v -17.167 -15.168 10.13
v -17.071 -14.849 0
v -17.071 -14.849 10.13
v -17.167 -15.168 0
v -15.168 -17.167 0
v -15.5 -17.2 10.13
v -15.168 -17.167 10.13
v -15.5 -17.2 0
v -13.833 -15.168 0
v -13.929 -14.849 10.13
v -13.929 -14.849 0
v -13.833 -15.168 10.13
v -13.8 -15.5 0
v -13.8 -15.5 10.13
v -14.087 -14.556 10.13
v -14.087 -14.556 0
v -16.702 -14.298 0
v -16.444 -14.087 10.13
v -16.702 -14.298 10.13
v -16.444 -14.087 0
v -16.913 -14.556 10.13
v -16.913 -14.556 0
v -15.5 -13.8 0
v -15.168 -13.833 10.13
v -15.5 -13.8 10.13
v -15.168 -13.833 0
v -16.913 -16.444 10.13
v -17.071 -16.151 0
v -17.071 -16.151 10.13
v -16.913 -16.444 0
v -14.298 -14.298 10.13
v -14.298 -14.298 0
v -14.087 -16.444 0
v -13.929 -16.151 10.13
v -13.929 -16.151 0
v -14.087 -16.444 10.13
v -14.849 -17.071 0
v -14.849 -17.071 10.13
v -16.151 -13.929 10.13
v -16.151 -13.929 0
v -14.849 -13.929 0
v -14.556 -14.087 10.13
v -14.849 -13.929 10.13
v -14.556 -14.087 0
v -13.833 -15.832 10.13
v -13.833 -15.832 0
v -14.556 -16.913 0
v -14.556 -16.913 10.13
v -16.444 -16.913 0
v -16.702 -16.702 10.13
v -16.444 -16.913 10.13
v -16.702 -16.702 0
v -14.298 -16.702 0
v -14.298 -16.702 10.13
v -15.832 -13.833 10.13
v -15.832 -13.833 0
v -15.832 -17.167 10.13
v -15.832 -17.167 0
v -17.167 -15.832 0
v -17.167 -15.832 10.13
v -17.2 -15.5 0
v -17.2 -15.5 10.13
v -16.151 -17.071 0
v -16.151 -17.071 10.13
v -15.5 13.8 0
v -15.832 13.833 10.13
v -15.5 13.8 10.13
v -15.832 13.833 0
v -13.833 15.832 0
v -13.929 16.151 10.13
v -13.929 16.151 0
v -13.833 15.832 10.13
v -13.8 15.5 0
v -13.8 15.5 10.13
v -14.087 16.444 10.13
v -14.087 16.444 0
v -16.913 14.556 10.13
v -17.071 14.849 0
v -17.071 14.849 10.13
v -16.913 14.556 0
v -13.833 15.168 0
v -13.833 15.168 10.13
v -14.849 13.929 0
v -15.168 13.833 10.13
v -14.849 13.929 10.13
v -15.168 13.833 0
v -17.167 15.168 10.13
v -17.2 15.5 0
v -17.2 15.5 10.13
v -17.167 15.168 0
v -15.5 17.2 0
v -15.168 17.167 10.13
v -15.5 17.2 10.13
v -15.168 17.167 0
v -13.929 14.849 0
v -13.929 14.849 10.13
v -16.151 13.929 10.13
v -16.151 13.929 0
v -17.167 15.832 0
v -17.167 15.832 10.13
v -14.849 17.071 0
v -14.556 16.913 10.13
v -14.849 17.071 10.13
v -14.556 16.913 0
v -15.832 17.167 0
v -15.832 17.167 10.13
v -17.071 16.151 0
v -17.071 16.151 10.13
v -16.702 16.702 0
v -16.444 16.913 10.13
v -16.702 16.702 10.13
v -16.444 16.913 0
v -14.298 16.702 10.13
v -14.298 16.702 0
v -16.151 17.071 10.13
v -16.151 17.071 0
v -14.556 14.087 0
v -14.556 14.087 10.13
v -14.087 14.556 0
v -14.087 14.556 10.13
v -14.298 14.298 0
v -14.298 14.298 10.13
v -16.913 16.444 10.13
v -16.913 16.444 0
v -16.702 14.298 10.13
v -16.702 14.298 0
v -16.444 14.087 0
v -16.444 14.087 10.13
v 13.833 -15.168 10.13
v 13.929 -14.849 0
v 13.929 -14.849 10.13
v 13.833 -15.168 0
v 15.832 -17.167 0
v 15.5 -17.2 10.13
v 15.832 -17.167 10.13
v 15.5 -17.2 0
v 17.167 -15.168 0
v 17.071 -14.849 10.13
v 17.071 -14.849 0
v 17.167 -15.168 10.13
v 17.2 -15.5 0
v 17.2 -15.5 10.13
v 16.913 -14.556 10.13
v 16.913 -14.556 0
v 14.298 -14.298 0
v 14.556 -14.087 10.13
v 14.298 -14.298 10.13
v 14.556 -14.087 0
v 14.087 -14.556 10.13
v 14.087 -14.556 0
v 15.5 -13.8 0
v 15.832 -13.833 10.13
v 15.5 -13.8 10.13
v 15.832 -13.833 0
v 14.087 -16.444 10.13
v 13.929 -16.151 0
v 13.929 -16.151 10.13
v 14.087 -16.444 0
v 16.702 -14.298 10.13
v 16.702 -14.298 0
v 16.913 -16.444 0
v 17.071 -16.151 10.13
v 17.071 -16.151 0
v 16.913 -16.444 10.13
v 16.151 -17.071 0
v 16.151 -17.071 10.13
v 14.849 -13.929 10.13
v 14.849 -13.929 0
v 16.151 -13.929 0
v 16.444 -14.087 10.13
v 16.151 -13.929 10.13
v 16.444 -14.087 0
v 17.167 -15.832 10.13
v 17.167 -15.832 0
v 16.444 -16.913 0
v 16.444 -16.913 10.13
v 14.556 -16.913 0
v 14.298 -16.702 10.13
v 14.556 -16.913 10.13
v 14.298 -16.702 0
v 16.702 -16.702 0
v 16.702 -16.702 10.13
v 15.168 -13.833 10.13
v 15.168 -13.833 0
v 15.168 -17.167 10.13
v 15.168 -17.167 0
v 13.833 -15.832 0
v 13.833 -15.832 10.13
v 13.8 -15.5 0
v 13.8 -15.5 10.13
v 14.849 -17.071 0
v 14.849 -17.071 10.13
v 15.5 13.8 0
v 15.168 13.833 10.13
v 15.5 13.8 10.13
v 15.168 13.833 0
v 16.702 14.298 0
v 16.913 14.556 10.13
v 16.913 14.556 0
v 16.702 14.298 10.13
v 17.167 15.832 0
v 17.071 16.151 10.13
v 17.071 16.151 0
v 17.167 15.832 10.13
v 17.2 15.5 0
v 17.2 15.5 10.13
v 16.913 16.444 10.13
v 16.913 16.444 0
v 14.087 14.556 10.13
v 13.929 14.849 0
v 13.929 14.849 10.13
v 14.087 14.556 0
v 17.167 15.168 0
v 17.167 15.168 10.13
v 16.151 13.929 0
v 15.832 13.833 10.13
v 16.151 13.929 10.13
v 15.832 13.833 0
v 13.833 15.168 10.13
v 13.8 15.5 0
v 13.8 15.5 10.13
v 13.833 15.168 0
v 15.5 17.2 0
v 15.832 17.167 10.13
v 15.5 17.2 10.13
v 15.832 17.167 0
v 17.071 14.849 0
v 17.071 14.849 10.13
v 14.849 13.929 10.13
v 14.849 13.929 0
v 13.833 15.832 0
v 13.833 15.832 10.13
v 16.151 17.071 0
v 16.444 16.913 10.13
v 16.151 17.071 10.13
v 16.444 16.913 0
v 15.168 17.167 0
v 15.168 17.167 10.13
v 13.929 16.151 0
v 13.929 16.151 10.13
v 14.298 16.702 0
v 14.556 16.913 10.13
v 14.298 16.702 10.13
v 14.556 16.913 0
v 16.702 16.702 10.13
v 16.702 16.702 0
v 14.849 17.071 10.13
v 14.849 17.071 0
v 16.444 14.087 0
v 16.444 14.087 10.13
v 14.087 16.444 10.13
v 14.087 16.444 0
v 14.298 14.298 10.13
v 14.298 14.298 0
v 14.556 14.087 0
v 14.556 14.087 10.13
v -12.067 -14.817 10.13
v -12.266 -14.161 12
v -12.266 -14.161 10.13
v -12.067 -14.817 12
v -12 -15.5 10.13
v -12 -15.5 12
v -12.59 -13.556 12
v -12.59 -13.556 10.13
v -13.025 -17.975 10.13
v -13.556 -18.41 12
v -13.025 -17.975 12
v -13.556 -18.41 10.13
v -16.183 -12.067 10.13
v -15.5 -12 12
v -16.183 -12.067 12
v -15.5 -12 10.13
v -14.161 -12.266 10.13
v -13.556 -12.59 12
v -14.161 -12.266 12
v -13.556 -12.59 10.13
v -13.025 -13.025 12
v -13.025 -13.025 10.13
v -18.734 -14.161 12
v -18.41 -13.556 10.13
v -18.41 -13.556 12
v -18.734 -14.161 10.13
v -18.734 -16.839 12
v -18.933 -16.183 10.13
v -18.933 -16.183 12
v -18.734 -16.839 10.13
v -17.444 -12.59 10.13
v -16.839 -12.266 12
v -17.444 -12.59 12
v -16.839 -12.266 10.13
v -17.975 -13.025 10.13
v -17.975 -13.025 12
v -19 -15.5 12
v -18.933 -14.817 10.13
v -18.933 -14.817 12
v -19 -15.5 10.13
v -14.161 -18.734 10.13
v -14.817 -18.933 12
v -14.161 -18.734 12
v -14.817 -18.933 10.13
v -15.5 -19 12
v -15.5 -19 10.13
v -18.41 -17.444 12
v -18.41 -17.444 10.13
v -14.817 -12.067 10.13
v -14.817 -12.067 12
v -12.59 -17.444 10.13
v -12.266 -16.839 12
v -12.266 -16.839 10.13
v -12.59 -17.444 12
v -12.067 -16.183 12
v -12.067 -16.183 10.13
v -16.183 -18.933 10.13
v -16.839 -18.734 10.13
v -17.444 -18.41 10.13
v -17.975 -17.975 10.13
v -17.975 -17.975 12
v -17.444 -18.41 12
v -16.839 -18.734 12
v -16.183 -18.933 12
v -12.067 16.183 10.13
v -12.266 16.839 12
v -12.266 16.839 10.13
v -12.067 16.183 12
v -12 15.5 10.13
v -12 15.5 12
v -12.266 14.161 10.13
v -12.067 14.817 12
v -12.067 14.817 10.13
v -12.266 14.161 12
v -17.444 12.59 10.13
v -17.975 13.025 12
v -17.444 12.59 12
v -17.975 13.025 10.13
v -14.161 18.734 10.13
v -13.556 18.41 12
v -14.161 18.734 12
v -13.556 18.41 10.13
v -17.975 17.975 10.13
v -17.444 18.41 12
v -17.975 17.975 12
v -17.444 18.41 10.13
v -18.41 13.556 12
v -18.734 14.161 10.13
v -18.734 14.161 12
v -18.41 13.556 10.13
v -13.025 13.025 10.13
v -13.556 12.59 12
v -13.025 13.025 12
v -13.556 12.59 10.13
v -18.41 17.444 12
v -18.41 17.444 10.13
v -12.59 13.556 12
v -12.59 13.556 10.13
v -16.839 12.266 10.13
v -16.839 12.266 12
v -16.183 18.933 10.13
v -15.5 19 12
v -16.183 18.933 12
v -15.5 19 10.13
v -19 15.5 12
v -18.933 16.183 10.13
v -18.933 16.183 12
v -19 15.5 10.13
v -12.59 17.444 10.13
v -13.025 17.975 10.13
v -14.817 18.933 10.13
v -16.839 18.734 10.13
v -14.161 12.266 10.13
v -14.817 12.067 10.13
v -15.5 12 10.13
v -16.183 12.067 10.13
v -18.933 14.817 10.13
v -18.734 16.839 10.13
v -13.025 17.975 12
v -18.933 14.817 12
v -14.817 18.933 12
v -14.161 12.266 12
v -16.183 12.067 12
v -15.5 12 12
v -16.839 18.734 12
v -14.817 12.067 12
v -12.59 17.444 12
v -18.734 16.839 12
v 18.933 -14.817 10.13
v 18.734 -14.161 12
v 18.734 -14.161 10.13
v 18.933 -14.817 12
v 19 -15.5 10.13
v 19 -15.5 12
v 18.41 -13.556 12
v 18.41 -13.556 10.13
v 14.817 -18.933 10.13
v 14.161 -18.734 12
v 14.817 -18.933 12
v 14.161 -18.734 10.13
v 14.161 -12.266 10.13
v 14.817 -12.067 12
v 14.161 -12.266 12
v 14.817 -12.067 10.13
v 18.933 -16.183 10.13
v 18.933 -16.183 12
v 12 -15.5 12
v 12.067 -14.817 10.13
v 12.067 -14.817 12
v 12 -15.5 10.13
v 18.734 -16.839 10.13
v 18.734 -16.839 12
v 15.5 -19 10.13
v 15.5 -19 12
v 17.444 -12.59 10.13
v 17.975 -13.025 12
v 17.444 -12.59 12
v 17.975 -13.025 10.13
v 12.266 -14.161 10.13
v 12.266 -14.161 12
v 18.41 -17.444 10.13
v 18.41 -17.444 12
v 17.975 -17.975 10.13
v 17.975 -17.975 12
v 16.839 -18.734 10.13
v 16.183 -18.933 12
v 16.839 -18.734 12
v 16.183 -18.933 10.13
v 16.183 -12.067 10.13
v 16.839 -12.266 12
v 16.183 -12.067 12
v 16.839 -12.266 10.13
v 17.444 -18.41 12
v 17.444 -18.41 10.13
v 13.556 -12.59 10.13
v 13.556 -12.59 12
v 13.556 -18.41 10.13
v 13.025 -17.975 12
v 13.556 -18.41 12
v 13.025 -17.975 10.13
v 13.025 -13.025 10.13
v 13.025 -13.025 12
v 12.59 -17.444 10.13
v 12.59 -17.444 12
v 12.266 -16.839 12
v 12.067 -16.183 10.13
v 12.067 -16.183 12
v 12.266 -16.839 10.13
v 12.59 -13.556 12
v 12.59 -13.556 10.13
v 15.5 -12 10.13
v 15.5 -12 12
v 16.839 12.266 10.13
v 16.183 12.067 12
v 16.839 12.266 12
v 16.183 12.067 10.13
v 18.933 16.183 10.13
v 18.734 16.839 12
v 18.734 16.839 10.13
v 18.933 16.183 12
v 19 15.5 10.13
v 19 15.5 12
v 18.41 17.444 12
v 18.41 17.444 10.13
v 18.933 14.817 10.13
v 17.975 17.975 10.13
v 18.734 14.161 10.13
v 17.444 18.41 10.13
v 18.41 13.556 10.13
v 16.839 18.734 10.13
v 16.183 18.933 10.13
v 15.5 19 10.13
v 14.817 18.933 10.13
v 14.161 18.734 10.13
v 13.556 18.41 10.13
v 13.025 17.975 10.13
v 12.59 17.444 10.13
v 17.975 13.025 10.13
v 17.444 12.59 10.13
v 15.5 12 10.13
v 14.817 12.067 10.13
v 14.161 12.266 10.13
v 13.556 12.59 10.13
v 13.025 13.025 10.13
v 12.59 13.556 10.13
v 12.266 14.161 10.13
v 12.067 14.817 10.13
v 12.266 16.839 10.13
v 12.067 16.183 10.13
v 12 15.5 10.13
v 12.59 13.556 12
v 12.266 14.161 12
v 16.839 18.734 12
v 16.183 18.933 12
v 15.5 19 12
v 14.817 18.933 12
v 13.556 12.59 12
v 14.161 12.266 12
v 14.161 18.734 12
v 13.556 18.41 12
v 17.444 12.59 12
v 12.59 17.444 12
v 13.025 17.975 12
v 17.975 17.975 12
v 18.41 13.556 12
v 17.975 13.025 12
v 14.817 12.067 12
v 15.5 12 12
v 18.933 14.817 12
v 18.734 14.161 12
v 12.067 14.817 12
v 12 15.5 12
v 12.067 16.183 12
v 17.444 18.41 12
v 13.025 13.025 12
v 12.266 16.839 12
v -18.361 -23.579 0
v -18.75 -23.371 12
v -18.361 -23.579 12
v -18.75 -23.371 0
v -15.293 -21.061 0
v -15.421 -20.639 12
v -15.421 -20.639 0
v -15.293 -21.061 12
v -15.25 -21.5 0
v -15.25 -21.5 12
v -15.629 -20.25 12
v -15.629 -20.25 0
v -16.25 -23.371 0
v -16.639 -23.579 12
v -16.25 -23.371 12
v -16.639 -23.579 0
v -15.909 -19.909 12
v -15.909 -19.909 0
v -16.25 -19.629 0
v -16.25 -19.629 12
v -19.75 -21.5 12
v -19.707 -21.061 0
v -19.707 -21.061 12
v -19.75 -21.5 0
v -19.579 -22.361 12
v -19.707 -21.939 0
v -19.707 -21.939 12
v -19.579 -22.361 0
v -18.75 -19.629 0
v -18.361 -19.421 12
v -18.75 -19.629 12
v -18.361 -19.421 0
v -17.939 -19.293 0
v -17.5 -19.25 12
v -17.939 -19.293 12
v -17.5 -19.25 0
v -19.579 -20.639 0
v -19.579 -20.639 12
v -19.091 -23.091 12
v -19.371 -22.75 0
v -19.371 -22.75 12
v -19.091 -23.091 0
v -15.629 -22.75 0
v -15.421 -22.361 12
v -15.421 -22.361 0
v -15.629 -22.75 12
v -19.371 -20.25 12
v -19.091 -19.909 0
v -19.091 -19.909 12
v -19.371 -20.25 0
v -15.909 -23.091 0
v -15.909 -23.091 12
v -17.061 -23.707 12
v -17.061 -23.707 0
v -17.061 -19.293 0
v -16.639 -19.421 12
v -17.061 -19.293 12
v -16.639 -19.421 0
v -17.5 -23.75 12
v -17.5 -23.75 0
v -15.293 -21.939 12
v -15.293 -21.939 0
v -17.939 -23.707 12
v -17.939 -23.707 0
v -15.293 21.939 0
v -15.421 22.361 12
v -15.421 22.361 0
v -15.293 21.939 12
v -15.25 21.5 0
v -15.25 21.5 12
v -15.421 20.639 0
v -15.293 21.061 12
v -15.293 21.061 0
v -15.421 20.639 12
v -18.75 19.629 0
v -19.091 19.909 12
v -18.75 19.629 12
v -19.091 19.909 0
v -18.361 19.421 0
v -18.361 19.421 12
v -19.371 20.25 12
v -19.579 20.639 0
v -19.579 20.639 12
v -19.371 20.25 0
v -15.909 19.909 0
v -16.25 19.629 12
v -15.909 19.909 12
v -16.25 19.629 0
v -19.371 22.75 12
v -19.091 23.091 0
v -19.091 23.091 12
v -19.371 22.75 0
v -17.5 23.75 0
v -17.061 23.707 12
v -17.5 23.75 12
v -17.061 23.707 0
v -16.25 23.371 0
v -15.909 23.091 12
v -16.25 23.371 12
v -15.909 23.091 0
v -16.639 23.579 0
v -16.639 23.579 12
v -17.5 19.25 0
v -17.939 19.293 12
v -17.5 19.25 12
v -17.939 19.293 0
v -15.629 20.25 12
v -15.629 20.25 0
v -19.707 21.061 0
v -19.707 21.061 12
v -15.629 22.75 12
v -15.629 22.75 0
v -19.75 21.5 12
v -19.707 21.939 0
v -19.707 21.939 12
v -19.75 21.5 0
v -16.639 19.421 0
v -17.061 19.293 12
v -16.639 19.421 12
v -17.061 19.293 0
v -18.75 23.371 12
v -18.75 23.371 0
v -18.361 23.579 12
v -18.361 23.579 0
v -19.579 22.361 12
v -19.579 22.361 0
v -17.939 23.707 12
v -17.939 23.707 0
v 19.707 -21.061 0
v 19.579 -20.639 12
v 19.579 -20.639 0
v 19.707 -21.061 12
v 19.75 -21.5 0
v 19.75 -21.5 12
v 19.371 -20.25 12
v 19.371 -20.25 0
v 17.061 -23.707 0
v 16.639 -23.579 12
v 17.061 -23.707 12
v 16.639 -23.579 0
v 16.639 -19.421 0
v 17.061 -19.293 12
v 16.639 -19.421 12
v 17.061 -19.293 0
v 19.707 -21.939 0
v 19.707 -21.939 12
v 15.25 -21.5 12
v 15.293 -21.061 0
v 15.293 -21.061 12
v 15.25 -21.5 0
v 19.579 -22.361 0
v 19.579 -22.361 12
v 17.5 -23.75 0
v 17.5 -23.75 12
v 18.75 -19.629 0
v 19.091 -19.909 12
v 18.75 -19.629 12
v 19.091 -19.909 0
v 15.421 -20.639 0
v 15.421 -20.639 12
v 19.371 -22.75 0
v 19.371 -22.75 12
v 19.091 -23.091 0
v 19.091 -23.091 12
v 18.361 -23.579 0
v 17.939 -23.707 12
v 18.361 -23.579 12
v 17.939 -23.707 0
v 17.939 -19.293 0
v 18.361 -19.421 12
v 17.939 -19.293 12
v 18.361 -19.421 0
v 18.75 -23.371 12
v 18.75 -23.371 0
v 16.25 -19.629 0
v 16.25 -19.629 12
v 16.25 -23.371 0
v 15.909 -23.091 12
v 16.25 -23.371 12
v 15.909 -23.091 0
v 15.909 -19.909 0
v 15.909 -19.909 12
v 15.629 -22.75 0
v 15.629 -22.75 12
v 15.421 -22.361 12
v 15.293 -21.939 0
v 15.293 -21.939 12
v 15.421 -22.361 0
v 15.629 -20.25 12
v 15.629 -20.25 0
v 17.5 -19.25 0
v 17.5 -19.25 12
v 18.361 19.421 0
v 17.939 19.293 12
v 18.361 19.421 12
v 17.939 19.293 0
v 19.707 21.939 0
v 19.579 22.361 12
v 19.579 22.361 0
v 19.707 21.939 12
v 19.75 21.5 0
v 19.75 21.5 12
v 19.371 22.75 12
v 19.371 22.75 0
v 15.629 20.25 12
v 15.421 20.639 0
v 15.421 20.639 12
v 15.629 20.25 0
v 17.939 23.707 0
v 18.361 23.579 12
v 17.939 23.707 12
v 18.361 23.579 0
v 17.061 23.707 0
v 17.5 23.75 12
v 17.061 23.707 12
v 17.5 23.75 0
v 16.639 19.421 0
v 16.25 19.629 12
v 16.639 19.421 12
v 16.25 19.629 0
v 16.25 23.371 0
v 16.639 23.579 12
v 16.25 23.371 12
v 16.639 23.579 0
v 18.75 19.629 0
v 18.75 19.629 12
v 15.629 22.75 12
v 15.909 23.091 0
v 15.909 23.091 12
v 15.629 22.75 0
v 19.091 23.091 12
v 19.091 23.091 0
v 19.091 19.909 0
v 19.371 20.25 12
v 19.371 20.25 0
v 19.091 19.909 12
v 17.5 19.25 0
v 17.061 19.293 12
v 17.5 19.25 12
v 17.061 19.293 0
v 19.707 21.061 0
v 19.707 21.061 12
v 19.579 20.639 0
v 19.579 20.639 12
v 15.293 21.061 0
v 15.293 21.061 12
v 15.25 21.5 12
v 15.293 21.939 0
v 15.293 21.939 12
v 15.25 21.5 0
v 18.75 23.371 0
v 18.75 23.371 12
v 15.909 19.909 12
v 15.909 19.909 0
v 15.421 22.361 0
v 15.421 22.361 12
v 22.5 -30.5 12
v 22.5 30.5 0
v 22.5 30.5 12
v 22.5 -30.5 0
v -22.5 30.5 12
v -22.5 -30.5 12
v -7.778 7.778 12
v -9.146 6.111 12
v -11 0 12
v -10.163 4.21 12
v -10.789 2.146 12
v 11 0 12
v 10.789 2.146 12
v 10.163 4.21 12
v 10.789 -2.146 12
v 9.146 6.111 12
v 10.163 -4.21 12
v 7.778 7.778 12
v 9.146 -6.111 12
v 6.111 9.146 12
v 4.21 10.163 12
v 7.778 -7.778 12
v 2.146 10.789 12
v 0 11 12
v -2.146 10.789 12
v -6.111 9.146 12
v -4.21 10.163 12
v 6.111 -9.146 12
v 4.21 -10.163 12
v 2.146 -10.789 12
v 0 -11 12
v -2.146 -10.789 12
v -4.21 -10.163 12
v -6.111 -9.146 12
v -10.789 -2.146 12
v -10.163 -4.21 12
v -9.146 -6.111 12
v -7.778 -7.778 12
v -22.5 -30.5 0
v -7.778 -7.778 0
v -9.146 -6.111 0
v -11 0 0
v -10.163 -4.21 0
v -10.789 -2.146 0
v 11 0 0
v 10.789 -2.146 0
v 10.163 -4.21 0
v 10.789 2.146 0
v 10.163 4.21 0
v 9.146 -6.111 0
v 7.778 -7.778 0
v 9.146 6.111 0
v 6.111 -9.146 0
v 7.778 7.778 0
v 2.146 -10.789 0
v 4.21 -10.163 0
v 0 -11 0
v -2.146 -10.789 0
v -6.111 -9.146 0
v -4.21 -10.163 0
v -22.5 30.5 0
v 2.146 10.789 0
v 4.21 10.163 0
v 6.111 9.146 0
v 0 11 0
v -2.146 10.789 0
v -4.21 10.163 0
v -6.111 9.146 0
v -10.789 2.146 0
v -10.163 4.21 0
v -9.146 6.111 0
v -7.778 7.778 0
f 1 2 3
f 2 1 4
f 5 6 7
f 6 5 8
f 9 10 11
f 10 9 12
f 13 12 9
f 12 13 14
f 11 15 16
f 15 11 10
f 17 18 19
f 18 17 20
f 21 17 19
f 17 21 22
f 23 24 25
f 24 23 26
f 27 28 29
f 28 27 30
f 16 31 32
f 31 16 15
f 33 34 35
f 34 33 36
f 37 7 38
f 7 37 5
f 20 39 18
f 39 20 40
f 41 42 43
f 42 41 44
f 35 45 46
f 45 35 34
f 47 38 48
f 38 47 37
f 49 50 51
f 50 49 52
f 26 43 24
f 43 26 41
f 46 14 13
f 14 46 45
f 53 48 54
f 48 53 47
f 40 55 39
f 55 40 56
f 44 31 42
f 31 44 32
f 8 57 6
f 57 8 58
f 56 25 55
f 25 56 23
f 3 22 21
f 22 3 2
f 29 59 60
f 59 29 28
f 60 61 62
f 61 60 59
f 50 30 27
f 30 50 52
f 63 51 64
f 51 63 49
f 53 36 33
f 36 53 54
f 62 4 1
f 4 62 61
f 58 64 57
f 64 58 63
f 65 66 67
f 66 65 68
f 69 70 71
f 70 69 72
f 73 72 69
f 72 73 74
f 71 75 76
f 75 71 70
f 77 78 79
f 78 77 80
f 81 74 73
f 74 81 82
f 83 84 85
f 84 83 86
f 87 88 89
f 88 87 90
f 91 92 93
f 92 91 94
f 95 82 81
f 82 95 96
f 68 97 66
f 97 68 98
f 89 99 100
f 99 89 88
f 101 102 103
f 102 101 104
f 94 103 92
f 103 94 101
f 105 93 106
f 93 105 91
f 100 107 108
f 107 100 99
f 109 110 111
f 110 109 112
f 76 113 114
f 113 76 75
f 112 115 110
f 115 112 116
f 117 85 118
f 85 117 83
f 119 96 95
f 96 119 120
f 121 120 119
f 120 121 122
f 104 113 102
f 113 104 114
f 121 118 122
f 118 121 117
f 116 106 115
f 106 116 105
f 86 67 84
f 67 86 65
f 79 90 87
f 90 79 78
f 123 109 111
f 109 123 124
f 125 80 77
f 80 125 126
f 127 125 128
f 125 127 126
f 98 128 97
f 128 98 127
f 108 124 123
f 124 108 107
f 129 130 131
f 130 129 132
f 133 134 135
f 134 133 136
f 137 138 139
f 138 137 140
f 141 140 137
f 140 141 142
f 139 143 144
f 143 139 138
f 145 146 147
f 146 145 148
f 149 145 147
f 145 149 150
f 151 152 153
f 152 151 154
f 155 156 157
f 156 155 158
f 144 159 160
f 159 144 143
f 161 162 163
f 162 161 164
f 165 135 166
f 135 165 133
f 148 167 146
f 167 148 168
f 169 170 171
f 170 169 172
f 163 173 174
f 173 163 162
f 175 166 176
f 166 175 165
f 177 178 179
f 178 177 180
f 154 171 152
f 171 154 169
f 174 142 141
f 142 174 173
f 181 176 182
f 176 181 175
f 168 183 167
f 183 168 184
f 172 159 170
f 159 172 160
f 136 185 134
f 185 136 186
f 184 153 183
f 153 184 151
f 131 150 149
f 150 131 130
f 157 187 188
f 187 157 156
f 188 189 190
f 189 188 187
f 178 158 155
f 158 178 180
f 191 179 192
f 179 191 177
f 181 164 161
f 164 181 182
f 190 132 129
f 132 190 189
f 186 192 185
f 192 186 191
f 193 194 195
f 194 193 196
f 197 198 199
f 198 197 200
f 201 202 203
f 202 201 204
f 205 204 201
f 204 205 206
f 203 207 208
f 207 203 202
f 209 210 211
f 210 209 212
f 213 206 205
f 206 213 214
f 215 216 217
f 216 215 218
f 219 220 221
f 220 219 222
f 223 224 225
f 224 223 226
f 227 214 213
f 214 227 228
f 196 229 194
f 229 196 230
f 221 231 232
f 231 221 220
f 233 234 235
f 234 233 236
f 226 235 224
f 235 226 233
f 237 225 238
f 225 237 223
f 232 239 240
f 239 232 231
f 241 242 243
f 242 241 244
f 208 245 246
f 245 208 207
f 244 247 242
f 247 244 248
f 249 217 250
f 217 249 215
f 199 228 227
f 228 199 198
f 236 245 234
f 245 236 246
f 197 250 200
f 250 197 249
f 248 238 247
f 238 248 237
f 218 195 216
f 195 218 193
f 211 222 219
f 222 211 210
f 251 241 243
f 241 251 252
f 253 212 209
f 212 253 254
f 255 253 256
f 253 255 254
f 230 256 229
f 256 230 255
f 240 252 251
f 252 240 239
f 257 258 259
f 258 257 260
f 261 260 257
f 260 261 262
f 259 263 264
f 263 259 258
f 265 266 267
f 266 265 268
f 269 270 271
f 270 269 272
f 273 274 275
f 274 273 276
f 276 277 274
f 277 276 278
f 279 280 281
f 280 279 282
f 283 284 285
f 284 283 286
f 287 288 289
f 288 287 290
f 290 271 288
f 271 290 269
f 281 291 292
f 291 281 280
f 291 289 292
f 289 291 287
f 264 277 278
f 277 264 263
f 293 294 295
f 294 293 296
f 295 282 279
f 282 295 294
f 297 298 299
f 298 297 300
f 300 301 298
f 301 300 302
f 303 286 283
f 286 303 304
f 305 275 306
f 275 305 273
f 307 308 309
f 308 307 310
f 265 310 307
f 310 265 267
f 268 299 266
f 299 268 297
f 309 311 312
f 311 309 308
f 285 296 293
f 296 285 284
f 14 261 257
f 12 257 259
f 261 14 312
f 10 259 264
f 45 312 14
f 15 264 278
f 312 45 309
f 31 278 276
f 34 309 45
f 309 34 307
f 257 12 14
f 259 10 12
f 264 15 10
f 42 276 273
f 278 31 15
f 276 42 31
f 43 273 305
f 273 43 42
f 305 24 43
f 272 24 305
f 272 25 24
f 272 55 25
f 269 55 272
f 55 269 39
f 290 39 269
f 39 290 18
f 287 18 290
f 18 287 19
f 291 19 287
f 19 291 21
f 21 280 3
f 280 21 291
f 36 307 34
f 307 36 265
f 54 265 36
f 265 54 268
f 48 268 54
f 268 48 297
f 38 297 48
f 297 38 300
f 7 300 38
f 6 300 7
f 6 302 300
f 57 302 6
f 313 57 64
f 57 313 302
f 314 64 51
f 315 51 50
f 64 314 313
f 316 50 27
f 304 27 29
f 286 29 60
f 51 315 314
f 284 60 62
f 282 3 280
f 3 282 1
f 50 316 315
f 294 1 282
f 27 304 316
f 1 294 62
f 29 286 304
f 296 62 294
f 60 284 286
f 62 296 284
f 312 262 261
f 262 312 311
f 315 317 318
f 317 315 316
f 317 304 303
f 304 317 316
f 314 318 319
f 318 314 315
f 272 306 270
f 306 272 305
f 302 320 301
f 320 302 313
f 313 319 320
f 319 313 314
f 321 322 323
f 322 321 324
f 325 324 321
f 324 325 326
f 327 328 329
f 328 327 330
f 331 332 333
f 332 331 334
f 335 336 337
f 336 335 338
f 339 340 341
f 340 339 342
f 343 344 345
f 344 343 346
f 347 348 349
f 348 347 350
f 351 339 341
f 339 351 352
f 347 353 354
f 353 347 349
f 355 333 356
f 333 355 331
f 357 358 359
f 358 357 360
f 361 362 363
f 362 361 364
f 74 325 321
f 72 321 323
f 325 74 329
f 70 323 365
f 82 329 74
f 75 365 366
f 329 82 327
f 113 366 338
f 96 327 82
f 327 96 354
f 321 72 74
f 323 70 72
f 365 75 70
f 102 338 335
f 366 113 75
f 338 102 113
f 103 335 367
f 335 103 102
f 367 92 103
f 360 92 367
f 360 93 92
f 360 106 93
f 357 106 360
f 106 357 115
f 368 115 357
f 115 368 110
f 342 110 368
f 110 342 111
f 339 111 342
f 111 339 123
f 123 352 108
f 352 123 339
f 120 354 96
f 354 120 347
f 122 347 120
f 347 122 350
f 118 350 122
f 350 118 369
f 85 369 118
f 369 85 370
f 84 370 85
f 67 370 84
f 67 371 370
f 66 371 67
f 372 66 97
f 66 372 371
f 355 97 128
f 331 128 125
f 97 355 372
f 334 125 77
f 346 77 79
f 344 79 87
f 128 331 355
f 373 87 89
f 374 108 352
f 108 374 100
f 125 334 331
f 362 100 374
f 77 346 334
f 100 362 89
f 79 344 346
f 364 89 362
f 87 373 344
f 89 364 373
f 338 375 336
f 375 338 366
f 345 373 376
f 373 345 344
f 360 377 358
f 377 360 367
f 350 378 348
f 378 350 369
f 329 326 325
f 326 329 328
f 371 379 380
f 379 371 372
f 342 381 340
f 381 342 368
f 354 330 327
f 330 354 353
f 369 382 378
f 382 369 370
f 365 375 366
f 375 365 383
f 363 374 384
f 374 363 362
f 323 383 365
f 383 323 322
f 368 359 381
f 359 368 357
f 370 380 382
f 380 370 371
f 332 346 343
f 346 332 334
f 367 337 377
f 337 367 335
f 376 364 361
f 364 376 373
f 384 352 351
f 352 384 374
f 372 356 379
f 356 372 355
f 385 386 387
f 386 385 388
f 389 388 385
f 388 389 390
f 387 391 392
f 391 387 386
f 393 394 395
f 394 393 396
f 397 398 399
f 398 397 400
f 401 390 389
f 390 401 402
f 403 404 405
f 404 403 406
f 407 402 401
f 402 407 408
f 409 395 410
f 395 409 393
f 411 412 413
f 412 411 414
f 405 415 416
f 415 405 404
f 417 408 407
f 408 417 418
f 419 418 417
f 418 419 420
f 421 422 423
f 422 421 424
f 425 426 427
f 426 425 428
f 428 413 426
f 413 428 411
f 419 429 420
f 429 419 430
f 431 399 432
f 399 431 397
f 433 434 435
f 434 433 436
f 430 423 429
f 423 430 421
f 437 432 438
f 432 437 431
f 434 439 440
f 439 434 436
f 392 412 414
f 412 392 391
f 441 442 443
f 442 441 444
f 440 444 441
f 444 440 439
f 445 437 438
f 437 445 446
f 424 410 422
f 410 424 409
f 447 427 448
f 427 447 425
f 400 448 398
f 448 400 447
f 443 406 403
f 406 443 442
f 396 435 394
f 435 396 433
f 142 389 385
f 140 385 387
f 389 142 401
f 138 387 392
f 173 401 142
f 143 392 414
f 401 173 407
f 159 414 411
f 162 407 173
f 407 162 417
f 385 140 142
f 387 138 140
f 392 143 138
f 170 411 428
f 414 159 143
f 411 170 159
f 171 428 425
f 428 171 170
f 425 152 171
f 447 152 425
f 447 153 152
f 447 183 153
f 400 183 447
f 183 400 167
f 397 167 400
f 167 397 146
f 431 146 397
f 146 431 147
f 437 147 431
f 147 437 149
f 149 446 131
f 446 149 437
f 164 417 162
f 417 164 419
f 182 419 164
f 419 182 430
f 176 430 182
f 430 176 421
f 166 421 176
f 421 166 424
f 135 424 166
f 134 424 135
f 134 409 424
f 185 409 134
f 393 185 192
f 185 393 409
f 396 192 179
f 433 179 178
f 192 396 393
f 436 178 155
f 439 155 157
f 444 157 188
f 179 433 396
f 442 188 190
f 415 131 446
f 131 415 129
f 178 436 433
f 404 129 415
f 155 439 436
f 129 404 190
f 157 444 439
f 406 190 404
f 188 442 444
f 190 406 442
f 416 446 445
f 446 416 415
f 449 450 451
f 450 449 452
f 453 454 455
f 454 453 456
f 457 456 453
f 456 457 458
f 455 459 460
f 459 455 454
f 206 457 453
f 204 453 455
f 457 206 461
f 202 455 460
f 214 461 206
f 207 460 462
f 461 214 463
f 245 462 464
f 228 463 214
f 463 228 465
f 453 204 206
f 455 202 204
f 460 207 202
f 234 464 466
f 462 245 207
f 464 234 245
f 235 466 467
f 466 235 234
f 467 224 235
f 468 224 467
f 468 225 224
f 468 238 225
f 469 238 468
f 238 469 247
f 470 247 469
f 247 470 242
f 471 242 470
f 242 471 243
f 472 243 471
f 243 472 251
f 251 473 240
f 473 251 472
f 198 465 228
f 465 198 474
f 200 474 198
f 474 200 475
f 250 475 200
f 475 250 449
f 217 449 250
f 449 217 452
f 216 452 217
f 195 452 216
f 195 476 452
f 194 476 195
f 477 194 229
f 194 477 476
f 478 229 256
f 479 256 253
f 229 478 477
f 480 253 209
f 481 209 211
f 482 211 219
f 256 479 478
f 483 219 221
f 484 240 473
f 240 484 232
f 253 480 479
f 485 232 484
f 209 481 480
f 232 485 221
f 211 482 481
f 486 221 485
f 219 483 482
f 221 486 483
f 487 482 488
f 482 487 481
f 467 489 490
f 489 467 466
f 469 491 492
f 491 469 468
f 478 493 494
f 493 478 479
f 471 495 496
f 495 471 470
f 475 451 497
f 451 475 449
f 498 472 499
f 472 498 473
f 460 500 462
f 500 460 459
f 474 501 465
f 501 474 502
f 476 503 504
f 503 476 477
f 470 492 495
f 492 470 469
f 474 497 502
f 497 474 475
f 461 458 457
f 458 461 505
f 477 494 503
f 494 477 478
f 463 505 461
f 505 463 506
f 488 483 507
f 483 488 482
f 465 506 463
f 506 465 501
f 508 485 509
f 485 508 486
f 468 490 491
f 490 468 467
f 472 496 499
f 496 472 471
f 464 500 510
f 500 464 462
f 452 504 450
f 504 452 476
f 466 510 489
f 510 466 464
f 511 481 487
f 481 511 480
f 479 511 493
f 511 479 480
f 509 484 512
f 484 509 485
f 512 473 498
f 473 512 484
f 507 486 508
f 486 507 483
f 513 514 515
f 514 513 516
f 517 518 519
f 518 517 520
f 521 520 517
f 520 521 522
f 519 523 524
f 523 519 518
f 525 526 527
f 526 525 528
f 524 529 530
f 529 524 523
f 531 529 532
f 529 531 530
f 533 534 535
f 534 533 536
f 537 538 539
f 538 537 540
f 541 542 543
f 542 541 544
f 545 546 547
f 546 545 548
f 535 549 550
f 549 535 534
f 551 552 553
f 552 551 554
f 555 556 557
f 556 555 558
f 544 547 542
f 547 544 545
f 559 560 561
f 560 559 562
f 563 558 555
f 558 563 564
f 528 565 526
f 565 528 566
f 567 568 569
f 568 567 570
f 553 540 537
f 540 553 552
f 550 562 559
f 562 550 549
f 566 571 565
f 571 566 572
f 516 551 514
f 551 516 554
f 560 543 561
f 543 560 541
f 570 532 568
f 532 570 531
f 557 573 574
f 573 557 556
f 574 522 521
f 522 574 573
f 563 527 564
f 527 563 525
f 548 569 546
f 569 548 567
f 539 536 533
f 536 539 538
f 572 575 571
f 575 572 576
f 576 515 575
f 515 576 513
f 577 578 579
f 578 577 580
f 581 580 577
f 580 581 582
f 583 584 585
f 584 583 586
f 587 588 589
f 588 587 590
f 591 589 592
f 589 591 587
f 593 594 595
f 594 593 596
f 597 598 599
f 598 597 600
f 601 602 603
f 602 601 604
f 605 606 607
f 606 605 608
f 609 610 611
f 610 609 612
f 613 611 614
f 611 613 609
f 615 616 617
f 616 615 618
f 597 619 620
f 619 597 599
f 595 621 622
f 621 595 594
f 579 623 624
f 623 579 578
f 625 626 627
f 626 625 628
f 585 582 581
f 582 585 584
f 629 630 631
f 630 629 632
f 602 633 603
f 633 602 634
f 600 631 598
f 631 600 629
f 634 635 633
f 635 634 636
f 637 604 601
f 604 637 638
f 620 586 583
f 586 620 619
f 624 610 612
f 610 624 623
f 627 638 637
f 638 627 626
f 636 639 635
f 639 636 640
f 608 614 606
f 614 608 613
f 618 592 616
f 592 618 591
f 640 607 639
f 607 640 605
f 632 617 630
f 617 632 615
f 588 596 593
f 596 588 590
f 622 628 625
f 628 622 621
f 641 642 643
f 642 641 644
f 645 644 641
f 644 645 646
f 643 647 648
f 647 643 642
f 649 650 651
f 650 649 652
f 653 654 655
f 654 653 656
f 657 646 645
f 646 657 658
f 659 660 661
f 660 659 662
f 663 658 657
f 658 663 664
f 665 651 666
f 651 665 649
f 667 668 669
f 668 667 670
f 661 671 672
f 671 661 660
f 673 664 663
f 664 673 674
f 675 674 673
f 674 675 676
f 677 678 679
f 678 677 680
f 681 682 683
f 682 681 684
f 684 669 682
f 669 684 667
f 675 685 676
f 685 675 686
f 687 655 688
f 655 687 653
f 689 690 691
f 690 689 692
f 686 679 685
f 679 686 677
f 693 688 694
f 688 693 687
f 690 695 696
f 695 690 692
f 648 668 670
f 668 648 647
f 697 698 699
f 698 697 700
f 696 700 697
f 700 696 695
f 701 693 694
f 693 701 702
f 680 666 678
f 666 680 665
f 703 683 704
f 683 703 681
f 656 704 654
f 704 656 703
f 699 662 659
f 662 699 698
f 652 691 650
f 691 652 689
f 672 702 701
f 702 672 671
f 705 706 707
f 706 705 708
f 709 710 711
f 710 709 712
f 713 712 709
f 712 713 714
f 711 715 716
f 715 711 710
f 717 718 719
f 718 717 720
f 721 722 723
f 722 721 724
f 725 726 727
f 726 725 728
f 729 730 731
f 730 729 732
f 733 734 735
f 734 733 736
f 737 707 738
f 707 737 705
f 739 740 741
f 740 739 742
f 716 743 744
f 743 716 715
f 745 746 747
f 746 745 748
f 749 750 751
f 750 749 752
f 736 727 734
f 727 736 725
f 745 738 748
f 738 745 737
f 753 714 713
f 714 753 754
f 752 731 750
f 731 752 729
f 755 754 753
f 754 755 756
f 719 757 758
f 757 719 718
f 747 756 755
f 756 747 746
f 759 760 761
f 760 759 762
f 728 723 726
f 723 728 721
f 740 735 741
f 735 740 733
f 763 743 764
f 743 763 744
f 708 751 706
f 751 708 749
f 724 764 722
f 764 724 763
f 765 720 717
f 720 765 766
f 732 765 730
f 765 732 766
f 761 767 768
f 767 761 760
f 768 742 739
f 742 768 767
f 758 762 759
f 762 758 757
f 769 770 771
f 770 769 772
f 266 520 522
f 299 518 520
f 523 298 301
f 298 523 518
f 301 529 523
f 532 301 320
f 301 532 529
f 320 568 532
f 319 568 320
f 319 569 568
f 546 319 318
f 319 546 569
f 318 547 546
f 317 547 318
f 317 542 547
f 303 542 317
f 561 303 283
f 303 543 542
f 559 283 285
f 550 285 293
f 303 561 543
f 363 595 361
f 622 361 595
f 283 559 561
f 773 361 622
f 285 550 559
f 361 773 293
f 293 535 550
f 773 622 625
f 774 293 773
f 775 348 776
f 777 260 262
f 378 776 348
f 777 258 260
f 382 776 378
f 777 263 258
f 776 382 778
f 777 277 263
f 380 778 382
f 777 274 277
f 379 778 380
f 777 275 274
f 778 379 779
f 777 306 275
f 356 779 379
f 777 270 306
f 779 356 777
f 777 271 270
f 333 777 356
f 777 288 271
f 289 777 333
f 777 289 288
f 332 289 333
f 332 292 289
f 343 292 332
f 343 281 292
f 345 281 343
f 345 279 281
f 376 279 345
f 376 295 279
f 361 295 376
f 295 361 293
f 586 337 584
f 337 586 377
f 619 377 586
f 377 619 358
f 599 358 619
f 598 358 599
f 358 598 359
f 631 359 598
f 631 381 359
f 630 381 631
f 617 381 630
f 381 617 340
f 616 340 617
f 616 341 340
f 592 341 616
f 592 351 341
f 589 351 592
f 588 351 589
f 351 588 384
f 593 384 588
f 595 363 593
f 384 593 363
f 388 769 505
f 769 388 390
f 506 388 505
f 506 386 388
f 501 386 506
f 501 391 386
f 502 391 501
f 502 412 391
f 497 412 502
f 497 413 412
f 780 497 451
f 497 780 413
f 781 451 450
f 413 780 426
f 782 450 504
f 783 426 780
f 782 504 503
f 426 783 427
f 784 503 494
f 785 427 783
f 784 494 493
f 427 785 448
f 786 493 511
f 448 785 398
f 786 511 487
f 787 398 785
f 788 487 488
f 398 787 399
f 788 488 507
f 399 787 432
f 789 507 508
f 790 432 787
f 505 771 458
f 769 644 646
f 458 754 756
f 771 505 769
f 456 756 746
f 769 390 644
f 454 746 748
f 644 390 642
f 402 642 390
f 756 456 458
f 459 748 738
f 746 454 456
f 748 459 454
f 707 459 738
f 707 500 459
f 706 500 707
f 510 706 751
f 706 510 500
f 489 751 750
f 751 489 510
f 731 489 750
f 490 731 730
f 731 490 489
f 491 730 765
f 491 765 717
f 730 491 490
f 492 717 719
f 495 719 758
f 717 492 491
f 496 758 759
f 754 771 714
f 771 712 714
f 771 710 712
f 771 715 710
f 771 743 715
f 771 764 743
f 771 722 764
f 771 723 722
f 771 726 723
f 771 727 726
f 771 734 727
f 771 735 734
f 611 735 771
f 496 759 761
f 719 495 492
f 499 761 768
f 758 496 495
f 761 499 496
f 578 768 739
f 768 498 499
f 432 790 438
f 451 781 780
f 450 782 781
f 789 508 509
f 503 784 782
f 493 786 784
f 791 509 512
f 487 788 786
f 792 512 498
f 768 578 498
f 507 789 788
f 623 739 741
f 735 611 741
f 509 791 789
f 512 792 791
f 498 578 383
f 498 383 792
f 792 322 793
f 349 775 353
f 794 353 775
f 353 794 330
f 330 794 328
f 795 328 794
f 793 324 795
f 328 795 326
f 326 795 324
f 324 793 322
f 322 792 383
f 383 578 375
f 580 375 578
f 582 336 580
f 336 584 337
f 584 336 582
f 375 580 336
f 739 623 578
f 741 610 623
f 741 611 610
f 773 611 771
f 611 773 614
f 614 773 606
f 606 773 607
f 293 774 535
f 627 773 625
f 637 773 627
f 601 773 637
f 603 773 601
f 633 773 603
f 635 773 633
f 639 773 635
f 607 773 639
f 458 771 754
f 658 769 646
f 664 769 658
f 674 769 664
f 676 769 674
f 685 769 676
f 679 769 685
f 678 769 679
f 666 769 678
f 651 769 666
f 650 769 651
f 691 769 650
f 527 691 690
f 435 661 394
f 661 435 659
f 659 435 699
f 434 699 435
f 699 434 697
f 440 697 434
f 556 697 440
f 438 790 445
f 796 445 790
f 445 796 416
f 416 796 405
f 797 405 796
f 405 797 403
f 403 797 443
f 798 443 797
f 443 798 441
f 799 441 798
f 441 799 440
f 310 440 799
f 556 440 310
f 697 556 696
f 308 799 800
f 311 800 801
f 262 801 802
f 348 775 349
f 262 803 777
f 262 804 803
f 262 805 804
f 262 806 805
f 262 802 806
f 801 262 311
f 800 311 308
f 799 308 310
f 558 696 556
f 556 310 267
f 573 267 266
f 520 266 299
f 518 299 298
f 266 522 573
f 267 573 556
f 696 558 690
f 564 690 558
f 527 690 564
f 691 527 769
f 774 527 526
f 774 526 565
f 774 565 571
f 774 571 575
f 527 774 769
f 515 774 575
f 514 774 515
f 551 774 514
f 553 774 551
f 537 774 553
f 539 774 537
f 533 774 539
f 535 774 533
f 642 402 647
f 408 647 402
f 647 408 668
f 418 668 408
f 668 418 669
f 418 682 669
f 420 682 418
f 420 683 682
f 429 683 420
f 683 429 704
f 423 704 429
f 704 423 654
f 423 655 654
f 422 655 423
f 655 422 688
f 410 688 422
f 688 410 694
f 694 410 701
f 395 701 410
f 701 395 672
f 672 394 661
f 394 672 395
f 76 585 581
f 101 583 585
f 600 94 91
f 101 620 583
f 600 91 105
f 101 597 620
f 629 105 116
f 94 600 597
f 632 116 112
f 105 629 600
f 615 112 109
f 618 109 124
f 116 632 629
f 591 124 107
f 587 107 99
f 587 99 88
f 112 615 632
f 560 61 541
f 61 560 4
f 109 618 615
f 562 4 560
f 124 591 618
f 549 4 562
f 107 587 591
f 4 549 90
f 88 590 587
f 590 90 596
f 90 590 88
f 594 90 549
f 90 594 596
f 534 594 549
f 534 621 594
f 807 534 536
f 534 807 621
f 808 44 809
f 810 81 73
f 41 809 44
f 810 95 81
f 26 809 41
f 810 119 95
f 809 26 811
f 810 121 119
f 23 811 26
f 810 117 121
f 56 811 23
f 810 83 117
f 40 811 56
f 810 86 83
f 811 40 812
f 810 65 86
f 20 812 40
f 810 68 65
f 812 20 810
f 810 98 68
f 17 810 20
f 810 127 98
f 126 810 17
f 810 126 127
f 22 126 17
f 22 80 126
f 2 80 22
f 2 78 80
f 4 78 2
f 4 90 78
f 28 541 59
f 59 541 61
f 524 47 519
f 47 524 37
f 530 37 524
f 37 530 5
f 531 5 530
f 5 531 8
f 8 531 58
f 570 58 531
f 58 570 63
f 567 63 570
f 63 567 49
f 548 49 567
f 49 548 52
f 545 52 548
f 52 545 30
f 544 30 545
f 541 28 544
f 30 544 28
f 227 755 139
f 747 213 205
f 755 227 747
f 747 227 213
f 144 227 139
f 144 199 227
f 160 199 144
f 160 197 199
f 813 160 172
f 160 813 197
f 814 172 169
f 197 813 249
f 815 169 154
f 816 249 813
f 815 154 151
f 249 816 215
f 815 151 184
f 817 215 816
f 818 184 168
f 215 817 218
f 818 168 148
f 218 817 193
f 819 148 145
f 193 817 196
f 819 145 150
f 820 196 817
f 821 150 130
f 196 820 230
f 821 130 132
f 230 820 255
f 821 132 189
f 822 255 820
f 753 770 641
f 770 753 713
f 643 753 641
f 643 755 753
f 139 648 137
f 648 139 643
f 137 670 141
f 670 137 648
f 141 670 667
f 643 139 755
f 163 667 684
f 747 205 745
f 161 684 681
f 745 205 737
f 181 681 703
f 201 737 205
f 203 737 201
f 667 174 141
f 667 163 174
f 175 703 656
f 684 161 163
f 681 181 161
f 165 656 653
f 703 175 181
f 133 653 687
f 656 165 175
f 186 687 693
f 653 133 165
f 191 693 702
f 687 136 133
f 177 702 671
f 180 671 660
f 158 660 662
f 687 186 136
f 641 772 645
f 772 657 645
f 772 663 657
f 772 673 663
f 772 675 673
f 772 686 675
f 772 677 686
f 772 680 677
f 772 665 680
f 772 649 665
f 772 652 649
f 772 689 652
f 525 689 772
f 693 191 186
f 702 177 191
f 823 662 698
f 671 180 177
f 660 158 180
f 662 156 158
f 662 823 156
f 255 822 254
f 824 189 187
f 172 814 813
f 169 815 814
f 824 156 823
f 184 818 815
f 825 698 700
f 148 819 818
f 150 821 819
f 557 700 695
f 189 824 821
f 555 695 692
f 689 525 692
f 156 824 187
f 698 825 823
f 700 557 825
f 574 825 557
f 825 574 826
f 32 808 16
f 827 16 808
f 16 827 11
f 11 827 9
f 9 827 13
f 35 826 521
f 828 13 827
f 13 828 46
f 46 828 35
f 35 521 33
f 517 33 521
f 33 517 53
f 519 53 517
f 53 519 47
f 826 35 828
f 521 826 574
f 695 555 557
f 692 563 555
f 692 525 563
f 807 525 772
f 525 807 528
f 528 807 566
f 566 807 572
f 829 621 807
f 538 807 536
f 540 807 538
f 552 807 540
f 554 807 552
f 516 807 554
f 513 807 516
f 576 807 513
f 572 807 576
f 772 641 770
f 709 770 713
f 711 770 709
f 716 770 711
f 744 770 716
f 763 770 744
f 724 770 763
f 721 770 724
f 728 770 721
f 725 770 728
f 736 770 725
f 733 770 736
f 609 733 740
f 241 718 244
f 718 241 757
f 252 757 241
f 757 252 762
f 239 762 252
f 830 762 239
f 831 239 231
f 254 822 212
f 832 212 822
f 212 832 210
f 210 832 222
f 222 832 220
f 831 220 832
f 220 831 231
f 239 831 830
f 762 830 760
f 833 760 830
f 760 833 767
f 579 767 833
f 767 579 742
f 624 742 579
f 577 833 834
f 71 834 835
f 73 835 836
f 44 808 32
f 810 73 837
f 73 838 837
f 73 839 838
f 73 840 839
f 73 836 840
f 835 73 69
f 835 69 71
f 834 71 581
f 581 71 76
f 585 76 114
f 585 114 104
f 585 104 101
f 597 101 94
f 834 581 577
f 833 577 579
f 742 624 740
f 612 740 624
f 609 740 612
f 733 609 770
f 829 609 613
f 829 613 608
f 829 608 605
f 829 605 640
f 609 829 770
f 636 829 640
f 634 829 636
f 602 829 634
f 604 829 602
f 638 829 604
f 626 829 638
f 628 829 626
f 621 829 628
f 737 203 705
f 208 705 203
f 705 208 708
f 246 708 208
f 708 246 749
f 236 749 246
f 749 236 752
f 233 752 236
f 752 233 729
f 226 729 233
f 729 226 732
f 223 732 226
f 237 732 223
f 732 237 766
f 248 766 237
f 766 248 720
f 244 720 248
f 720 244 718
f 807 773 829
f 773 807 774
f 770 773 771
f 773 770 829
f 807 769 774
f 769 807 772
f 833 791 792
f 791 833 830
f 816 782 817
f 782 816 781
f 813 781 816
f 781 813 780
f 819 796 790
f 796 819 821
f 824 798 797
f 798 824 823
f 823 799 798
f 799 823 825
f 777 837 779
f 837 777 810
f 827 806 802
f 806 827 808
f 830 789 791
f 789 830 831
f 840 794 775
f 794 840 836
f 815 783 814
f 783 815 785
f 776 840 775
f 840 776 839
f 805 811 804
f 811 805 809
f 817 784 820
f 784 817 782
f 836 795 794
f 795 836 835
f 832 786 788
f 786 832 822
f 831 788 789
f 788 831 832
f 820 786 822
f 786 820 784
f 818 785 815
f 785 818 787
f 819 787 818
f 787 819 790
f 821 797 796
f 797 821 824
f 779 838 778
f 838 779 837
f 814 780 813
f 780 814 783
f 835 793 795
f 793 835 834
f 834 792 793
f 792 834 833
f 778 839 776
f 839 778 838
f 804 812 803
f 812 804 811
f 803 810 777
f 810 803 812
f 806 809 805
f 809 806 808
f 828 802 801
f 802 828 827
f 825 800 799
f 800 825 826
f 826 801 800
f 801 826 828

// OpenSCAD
$fn = 32;

// ----------------------------------------------------------------------
// Motor mount plate: NEMA17, 45 x 61 x 12 mm
// ----------------------------------------------------------------------

// --- parameters (mm) ---
plate_w = 45;             // plate length, X
plate_d = 61;             // plate width, Y
plate_t = 12;             // plate thickness
pattern = 31;             // NEMA17 bolt spacing
motor_d = 3.4;            // NEMA17 screw clearance
pilot_d = 22;             // pilot boss bore
cb_d = 7;                 // counterbore seat
cb_h = 1.87;              // counterbore depth
second_d = 4.5;           // second fastener hole

module plate() {
  translate([-plate_w / 2, -plate_d / 2, 0]) cube([plate_w, plate_d, plate_t]);
}

module motor_holes() {
  for (sx = [-1, 1]) for (sy = [-1, 1])
    translate([sx * pattern / 2, sy * pattern / 2, -1])
      cylinder(h = plate_t + 2, d = motor_d);
}
module motor_counterbores() {
  for (sx = [-1, 1]) for (sy = [-1, 1])
    translate([sx * pattern / 2, sy * pattern / 2, plate_t - cb_h])
      cylinder(h = cb_h + 0.6, d = cb_d);
}

difference() {
  union() {
    plate();
  }
  motor_holes();
  translate([0, 0, -1]) cylinder(h = plate_t + 2, d = pilot_d);
  motor_counterbores();
  for (sx = [-1, 1]) for (sy = [-1, 1])
    translate([sx * 17.5, sy * 21.5, -1]) cylinder(h = plate_t + 2, d = second_d);
}
